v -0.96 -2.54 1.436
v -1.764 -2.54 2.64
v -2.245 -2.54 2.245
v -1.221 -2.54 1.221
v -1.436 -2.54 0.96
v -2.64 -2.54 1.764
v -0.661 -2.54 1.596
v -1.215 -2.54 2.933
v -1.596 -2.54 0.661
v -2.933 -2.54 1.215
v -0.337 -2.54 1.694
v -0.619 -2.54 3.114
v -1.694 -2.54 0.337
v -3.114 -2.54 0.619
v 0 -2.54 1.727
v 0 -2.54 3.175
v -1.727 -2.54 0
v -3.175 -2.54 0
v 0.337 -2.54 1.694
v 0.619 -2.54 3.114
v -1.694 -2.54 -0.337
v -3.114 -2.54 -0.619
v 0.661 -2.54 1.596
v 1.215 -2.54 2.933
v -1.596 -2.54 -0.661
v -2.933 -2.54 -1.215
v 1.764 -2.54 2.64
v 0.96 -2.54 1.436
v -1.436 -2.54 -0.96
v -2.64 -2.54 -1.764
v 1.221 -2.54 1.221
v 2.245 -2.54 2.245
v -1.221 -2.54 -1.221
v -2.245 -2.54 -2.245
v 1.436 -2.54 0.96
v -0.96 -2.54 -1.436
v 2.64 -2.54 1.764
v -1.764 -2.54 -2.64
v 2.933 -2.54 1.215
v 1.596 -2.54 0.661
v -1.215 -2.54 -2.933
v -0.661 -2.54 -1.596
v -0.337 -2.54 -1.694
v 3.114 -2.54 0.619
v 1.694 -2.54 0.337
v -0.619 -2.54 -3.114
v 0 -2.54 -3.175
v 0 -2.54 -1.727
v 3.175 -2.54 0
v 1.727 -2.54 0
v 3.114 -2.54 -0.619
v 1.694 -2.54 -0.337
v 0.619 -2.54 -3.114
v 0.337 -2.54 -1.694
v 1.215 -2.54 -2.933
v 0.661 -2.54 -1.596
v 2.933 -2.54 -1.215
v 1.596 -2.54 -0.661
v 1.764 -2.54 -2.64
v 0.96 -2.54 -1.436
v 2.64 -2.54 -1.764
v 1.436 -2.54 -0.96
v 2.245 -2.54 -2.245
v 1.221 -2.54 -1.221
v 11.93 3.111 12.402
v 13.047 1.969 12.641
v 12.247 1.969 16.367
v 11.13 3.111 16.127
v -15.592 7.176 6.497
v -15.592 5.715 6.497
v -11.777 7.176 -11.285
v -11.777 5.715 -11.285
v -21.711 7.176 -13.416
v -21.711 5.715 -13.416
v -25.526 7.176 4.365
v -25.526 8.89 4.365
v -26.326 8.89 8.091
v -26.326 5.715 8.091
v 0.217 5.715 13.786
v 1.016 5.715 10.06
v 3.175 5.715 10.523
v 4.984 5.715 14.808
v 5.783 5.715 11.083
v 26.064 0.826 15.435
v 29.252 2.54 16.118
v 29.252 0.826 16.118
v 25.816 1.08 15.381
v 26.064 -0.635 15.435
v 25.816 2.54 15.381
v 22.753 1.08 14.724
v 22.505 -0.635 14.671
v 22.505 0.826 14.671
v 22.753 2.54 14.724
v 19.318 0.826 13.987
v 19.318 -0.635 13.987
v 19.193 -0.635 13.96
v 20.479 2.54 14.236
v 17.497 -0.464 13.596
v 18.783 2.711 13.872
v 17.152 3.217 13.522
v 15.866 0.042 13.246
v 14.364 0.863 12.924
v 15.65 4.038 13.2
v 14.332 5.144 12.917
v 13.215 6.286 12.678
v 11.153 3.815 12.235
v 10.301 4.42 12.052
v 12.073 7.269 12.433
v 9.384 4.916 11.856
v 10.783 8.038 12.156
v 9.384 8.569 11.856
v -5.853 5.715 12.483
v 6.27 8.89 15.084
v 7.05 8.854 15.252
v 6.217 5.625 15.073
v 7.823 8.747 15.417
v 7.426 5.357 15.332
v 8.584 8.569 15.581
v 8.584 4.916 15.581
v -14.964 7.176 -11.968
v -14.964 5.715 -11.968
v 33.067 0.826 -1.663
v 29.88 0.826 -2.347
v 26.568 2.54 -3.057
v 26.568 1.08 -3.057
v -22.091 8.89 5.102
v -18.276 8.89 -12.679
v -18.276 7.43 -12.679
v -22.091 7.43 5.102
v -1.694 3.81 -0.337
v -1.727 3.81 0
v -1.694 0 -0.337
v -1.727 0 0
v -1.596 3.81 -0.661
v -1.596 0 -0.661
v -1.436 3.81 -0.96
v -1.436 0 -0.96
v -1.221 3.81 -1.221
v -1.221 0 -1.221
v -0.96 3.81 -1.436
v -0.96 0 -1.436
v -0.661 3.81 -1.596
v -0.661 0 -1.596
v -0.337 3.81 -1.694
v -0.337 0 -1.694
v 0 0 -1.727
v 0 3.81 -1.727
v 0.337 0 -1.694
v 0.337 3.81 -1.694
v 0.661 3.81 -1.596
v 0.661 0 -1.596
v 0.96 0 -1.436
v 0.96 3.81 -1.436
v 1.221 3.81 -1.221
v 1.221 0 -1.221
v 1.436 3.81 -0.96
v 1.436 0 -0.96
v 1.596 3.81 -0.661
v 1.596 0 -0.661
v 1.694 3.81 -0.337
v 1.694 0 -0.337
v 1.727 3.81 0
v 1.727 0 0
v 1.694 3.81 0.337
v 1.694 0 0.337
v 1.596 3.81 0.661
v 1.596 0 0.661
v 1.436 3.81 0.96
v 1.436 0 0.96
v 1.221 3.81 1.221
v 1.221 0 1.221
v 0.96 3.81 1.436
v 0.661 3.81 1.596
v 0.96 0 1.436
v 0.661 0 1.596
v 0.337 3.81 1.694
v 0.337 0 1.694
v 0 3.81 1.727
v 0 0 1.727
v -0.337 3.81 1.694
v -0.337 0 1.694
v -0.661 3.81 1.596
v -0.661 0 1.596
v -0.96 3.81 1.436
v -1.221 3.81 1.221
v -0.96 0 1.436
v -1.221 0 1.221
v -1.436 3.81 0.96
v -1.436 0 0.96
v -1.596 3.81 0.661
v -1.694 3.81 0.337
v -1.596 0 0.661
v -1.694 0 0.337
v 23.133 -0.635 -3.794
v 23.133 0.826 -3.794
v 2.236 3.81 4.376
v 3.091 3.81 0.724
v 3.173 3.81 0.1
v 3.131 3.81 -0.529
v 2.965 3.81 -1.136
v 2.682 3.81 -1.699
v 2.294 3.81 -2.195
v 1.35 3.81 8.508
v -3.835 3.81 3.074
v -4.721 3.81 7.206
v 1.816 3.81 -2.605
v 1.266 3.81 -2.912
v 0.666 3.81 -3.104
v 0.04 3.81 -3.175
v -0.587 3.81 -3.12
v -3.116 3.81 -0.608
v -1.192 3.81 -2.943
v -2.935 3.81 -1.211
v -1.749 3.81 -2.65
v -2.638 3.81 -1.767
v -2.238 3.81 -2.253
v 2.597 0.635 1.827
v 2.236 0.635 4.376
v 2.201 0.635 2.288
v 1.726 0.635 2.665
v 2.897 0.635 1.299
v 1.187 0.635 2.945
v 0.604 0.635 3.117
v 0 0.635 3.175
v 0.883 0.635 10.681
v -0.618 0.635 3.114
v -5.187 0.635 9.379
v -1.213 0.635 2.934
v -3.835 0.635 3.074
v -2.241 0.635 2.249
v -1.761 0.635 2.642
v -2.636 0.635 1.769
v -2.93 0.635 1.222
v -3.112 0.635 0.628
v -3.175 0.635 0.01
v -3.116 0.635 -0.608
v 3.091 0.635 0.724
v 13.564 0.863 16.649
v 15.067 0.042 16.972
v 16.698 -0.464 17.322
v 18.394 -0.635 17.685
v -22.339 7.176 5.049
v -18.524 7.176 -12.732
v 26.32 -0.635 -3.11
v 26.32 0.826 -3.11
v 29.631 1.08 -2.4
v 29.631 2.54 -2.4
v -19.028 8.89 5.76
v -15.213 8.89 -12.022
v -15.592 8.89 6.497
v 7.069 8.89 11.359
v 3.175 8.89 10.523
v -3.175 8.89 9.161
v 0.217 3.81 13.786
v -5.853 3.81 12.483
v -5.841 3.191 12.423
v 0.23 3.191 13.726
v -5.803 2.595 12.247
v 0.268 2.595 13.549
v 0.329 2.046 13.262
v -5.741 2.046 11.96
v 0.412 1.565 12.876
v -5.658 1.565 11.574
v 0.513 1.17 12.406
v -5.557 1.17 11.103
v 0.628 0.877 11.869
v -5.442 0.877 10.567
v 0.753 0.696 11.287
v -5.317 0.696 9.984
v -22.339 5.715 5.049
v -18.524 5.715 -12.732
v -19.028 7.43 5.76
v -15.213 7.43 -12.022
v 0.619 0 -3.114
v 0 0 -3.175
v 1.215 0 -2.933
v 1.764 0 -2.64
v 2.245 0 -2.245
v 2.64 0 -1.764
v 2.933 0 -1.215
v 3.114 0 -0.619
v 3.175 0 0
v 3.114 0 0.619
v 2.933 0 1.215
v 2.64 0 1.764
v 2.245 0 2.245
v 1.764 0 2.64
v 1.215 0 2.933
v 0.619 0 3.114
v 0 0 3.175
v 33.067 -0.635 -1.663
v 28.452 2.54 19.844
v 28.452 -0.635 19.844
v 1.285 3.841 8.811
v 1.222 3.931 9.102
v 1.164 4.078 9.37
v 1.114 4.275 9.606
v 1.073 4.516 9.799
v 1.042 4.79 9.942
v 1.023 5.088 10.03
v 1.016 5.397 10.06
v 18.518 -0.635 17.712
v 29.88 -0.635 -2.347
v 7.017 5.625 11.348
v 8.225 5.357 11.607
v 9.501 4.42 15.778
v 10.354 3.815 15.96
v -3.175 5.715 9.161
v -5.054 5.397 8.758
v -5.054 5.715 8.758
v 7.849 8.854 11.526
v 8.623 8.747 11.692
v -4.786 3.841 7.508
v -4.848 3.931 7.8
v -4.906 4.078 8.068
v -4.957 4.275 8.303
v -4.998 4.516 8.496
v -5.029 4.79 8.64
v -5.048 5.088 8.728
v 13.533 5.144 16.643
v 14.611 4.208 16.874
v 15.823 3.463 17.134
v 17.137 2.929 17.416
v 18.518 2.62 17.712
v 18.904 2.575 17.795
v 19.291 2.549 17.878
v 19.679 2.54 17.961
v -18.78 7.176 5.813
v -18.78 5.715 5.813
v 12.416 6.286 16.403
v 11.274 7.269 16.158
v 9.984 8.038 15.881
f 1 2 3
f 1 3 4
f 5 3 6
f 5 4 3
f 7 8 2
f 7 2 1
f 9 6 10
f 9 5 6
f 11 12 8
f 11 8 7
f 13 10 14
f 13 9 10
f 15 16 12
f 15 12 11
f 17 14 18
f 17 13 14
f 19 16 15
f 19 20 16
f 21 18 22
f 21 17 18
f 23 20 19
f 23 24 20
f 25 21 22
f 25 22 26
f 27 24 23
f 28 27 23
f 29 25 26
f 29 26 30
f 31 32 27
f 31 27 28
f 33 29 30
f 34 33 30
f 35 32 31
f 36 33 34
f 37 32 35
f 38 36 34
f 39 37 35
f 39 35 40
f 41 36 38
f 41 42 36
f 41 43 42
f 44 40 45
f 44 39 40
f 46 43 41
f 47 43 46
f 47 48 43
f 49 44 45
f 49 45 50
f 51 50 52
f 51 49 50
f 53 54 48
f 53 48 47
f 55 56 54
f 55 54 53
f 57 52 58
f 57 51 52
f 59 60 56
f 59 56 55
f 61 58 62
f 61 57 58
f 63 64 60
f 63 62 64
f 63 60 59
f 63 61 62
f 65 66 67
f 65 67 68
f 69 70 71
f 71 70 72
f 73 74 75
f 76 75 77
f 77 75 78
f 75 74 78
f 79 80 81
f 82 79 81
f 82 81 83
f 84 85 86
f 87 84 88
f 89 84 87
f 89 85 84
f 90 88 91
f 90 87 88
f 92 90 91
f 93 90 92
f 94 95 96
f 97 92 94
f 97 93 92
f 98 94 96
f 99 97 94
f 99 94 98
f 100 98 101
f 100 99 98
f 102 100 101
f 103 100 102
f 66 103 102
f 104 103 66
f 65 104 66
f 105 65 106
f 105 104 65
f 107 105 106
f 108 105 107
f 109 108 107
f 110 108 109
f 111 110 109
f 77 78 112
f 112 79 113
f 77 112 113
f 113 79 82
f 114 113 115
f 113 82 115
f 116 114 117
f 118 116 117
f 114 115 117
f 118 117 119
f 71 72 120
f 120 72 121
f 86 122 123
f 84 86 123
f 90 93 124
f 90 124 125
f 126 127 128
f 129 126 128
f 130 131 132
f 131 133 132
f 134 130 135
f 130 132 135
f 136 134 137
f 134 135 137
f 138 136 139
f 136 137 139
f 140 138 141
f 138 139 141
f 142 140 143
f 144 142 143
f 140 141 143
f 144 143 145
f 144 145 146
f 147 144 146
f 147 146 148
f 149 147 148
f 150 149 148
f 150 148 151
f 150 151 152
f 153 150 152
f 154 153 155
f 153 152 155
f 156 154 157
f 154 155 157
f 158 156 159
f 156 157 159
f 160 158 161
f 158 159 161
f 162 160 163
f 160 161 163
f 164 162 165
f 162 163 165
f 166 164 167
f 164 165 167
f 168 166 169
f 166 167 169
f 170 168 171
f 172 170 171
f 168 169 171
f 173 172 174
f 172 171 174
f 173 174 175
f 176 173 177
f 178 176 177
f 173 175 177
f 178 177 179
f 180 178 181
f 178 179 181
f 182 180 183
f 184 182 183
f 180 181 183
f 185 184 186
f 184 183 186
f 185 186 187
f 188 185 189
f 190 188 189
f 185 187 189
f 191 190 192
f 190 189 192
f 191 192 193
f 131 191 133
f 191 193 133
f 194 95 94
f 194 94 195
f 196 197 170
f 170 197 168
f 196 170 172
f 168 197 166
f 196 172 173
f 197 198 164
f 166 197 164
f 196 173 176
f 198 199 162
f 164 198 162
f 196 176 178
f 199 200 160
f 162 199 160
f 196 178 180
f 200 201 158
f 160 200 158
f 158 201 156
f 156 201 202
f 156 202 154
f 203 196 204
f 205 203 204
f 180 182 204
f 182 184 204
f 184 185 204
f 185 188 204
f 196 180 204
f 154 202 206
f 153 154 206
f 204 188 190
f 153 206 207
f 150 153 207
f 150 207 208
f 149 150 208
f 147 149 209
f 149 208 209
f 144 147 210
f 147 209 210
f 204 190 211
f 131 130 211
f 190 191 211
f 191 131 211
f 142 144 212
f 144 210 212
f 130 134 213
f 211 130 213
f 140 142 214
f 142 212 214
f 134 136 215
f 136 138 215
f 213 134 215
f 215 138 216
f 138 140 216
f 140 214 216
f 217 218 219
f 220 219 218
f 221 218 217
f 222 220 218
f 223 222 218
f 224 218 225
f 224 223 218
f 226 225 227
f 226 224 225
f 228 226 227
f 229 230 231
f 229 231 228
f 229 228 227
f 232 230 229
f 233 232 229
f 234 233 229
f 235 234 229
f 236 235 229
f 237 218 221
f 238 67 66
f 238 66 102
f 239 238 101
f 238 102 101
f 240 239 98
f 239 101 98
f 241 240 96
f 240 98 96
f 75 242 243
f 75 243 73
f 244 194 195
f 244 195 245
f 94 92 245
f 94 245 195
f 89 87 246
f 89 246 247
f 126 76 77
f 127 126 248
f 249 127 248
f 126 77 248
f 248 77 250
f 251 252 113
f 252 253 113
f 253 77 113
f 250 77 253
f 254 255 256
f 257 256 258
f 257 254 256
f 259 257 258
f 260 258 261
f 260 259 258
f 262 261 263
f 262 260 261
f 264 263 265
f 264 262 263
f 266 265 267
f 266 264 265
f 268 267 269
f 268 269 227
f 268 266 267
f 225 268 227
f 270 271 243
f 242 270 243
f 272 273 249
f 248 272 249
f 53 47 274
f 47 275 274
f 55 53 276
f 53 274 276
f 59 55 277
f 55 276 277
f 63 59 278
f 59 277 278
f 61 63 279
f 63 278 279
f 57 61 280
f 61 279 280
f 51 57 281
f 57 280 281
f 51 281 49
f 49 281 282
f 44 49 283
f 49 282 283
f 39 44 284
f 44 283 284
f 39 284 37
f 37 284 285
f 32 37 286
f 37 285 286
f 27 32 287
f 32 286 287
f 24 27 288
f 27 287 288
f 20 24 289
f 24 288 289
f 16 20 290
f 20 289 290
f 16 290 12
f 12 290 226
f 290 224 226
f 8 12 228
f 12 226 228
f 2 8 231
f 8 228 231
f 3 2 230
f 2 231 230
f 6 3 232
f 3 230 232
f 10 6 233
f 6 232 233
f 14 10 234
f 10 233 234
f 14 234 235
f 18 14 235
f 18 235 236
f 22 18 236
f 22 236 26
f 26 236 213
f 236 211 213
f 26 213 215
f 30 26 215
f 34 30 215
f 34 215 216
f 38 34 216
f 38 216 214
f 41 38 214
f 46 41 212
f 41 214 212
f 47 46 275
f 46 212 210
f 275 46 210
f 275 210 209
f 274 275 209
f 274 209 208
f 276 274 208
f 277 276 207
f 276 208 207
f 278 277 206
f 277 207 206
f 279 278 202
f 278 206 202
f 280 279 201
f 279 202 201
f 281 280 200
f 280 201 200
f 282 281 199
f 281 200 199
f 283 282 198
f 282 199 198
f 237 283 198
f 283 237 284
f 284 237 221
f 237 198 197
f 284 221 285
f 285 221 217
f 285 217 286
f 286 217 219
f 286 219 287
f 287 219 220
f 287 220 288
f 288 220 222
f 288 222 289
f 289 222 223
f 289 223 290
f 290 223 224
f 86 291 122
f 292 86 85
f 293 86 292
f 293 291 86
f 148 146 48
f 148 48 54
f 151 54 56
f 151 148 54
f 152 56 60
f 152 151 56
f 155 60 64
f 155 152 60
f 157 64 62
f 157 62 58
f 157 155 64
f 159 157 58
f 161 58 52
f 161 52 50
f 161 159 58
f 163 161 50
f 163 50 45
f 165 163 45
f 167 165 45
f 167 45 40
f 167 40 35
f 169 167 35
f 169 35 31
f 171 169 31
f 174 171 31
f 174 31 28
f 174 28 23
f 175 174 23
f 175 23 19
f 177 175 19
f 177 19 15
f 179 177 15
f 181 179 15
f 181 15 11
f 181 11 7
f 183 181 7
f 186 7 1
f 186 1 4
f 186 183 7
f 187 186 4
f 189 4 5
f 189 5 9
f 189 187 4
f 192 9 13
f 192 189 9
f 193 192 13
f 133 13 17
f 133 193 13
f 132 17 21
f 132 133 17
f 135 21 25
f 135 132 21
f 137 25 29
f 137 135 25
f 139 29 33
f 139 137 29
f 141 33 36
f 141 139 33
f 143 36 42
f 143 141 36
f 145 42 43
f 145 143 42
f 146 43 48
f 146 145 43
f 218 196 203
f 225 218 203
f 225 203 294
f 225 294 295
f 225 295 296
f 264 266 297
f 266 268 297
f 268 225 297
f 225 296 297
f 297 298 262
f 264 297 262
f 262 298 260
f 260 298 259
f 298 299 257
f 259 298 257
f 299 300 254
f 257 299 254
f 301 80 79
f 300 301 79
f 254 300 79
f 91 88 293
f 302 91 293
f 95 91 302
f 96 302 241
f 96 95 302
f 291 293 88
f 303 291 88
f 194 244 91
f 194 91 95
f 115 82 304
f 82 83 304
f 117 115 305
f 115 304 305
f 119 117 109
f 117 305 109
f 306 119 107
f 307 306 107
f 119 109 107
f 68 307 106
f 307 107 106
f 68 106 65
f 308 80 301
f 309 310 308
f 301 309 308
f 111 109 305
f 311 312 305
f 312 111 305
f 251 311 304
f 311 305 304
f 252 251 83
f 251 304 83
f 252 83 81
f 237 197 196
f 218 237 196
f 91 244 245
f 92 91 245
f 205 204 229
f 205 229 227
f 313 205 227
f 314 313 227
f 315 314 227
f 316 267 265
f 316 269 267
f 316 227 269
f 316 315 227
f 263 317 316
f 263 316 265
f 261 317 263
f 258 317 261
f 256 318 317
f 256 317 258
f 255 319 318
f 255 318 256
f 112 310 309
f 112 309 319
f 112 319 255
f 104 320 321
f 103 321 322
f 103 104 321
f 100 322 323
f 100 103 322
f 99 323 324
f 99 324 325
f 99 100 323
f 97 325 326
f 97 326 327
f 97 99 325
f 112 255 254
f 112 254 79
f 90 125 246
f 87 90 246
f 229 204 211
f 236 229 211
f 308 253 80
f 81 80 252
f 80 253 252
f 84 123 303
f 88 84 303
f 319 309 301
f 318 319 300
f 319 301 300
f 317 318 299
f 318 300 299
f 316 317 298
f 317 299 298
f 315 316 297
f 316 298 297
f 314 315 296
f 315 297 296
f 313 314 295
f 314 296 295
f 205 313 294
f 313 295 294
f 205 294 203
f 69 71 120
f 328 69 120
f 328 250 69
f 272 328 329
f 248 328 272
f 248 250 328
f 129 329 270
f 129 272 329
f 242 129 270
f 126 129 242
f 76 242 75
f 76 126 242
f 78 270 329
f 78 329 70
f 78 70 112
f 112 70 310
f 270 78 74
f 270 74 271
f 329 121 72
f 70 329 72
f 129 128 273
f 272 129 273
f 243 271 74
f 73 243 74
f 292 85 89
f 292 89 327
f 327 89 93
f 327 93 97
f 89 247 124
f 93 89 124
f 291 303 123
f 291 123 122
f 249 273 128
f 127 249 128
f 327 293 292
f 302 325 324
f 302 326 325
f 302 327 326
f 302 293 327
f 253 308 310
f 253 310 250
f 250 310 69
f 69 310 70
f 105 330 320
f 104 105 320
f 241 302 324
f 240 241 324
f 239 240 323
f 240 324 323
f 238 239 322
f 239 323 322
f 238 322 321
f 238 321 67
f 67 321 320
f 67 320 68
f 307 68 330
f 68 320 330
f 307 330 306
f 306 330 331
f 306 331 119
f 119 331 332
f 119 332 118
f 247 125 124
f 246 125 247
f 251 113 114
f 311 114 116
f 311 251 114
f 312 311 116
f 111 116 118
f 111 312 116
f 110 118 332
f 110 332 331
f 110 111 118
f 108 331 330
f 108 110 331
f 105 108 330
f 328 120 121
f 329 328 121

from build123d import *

# Parameters (mm, degrees)
SKETCH1_R             = 3.175
BOSS_EXTRUDE1_DEPTH   = 8.89
F_4_CLEARANCE_HOLE1_D = 3.4544
BOSS_EXTRUDE2_START   = -3.175
BOSS_EXTRUDE2_DEPTH   = 3.175
BOSS_EXTRUDE3_DEPTH   = 3.81
BOSS_EXTRUDE4_START   = -9.525
BOSS_EXTRUDE4_DEPTH   = 3.175
CUT_EXTRUDE1_DEPTH    = 18.185920344
CUT_EXTRUDE2_DEPTH    = 5.08
BOSS_EXTRUDE5_START   = -20.938172
BOSS_EXTRUDE5_DEPTH   = 6.208698
BOSS_EXTRUDE6_DEPTH   = 3.175
FILLET2_R             = 8.89
FILLET3_R             = 1.5875
FILLET4_R             = 3.175
SKETCH16_R            = 3.175
SKETCH16_R_2          = 1.7272
BOSS_EXTRUDE7_DEPTH   = 2.54


with BuildPart() as part:
    # Sketch1 → Boss-Extrude1 (new body)
    with BuildSketch(Plane(origin=(0, 0, 0), x_dir=(1, 0, 0), z_dir=(0, 1, 0))):
        with Locations(Location((0, 0, 0), (0, 0, 270))):
            Circle(SKETCH1_R)
    extrude(amount=BOSS_EXTRUDE1_DEPTH)

    # #4 Clearance Hole1 (through all)
    with Locations(Plane(origin=(0, 8.89, 0), x_dir=(1, 0, 0), z_dir=(0, 1, 0))):
        with Locations((0, 0)):
            Hole(F_4_CLEARANCE_HOLE1_D / 2)

    # Sketch5 → Boss-Extrude2 (add)
    with BuildSketch(Plane(origin=(0, 8.89, 0), x_dir=(1, 0, 0), z_dir=(0, 1, 0)).offset(BOSS_EXTRUDE2_START)):
        with BuildLine():
            Line((-26.325590973, -8.090556636), (8.584422353, -15.580785179))
            Line((8.584422353, -15.580785179), (9.383698549, -11.85556605))
            Line((9.383698549, -11.85556605), (3.175, -10.523439056))
            Line((3.175, -10.523439056), (3.175, 0))
            ThreePointArc((3.175, 0), (0, -3.175), (-3.175, 0))
            Line((-3.175, 0), (-3.175, -9.160994683))
            Line((-3.175, -9.160994683), (-15.592397098, -6.496740696))
            Line((-15.592397098, -6.496740696), (-11.777286014, 11.284502966))
            Line((-11.777286014, 11.284502966), (-21.711203692, 13.415906155))
            Line((-21.711203692, 13.415906155), (-26.325590973, -8.090556636))
        make_face()
    extrude(amount=BOSS_EXTRUDE2_DEPTH)

    # Sketch11 → Boss-Extrude3 (add)
    with BuildSketch(Plane(origin=(-2.818068695, 0, 13.134287577), x_dir=(0.977747803012258, 0, 0.20978377845940036), z_dir=(-0.20978377845940033, 0, 0.9777478030122579))):
        Polygon((11.661996082, 8.89), (12.977124143, 8.89), (19.327124143, 2.54), (21.821996082, 2.54), (21.821996082, -0.635), (18.011996082, -0.635), (11.661996082, 5.715), align=None)
    extrude(amount=-BOSS_EXTRUDE3_DEPTH)

    # Sketch12 → Boss-Extrude4 (add)
    with BuildSketch(Plane(origin=(0, 8.89, 0), x_dir=(1, 0, 0), z_dir=(0, 1, 0)).offset(BOSS_EXTRUDE4_START)):
        Polygon((18.518340032, -17.712188368), (23.132727312, 3.794274423), (33.066644991, 1.662871234), (28.45225771, -19.843591557), align=None)
    extrude(amount=BOSS_EXTRUDE4_DEPTH)

    # Sketch6 → Cut-Extrude1 (cut)
    with BuildSketch(Plane(origin=(1.796318586, 0, -8.372175215), x_dir=(-0.977747803012258, 0, -0.20978377845940016), z_dir=(0.20978377845940016, 0, -0.977747803012258))):
        Polygon((17.142187862, 7.1755), (17.142187862, 5.715), (20.782854529, 5.715), (20.782854529, 7.1755), (24.042521196, 7.1755), (24.042521196, 8.89), (20.528854529, 8.89), (20.528854529, 7.4295), (17.396187862, 7.4295), (17.396187862, 8.89), (13.882521196, 8.89), (13.882521196, 7.1755), align=None)
        Polygon((-28.722329416, 0.8255), (-28.722329416, -0.635), (-25.081662749, -0.635), (-25.081662749, 0.8255), (-21.821996082, 0.8255), (-21.821996082, 2.54), (-25.335662749, 2.54), (-25.335662749, 1.0795), (-28.468329416, 1.0795), (-28.468329416, 2.54), (-31.981996082, 2.54), (-31.981996082, 0.8255), align=None)
    extrude(amount=-CUT_EXTRUDE1_DEPTH, mode=Mode.SUBTRACT)

    # Sketch13 → Cut-Extrude2 (cut)
    with BuildSketch(Plane(origin=(0, 8.89, 0), x_dir=(1, 0, 0), z_dir=(0, 1, 0))):
        Polygon((-3.175, -9.160994683), (3.175, -10.523439056), (3.175, 7.256560944), (-3.175, 7.256560944), align=None)
    extrude(amount=-CUT_EXTRUDE2_DEPTH, mode=Mode.SUBTRACT)


with BuildPart() as cut_extrude2_piece_1:
    # of the separate pieces the step leaves, piece 1, a body of its own (cut_extrude2_pieces)
    add(part.part.solids().sort_by_distance((-18.52407177, 5.715, -12.732080965))[0])

    # Sketch14 → Boss-Extrude5 (add)
    with BuildSketch(Plane(origin=(-23.507522278, 0, -5.04373094), x_dir=(-0.20978377845940016, 0, 0.977747803012258), z_dir=(-0.977747803012258, 0, -0.20978377845940016)).offset(BOSS_EXTRUDE5_START)):
        Polygon((3.81, 0.635), (13.433205921, 0.635), (13.433205921, 5.715), (9.635481661, 5.715), (9.623205921, 5.715), (9.623205921, 3.81), (3.81, 3.81), align=None)
    extrude(amount=-BOSS_EXTRUDE5_DEPTH)



with BuildPart() as cut_extrude2_piece_2:
    # of the separate pieces the step leaves, piece 2, a body of its own (cut_extrude2_pieces)
    add(part.part.solids().sort_by_distance((0, 0, 3.175))[0])


with BuildPart() as cut_extrude2_piece_1_1:
    add(cut_extrude2_piece_1.part)

    add(cut_extrude2_piece_2.part)  # Boss-Extrude6 merges Cut-Extrude2 piece 2
    # Sketch15 → Boss-Extrude6 (add)
    with BuildSketch(Plane(origin=(0, 3.81, 0), x_dir=(1, 0, 0), z_dir=(0, 1, 0))):
        with BuildLine():
            Line((-3.834546879, -3.073977009), (-3.116253173, 0.607940096))
            ThreePointArc((-3.116253173, 0.607940096), (-0.666063497, -3.104349275), (3.091361375, -0.723954316))
            Line((3.091361375, -0.723954316), (2.235994487, -4.37646125))
            Line((2.235994487, -4.37646125), (-3.834546879, -3.073977009))
        make_face()
    extrude(amount=-BOSS_EXTRUDE6_DEPTH)

    # Fillet2
    fillet2_edges = [cut_extrude2_piece_1_1.edges().sort_by_distance(p)[0] for p in [
        (8.984060451, 5.715, 13.718175614),
        (10.269924023, 8.89, 13.994068148),
        (16.478622572, 2.54, 15.326195141),
        (15.192759, -0.635, 15.050302607),
    ]]
    fillet(fillet2_edges, radius=FILLET2_R)

    # Fillet3
    fillet3_edges = [cut_extrude2_piece_1_1.edges().sort_by_distance(p)[0] for p in [
        (-2.01879269, 3.81, 9.409068406),
    ]]
    fillet(fillet3_edges, radius=FILLET3_R)

    # Fillet4
    fillet4_edges = [cut_extrude2_piece_1_1.edges().sort_by_distance(p)[0] for p in [
        (-2.818068886, 0.635, 13.134287535),
    ]]
    fillet(fillet4_edges, radius=FILLET4_R)

    # Sketch16 → Boss-Extrude7 (add)
    with BuildSketch(Plane.XZ):
        with Locations(Location((0, 0, 0), (0, 0, 270))):
            Circle(SKETCH16_R)
        with Locations(Location((0, 0, 0), (0, 0, 270))):
            Circle(SKETCH16_R_2, mode=Mode.SUBTRACT)
    extrude(amount=BOSS_EXTRUDE7_DEPTH)


solid = cut_extrude2_piece_1_1.part
